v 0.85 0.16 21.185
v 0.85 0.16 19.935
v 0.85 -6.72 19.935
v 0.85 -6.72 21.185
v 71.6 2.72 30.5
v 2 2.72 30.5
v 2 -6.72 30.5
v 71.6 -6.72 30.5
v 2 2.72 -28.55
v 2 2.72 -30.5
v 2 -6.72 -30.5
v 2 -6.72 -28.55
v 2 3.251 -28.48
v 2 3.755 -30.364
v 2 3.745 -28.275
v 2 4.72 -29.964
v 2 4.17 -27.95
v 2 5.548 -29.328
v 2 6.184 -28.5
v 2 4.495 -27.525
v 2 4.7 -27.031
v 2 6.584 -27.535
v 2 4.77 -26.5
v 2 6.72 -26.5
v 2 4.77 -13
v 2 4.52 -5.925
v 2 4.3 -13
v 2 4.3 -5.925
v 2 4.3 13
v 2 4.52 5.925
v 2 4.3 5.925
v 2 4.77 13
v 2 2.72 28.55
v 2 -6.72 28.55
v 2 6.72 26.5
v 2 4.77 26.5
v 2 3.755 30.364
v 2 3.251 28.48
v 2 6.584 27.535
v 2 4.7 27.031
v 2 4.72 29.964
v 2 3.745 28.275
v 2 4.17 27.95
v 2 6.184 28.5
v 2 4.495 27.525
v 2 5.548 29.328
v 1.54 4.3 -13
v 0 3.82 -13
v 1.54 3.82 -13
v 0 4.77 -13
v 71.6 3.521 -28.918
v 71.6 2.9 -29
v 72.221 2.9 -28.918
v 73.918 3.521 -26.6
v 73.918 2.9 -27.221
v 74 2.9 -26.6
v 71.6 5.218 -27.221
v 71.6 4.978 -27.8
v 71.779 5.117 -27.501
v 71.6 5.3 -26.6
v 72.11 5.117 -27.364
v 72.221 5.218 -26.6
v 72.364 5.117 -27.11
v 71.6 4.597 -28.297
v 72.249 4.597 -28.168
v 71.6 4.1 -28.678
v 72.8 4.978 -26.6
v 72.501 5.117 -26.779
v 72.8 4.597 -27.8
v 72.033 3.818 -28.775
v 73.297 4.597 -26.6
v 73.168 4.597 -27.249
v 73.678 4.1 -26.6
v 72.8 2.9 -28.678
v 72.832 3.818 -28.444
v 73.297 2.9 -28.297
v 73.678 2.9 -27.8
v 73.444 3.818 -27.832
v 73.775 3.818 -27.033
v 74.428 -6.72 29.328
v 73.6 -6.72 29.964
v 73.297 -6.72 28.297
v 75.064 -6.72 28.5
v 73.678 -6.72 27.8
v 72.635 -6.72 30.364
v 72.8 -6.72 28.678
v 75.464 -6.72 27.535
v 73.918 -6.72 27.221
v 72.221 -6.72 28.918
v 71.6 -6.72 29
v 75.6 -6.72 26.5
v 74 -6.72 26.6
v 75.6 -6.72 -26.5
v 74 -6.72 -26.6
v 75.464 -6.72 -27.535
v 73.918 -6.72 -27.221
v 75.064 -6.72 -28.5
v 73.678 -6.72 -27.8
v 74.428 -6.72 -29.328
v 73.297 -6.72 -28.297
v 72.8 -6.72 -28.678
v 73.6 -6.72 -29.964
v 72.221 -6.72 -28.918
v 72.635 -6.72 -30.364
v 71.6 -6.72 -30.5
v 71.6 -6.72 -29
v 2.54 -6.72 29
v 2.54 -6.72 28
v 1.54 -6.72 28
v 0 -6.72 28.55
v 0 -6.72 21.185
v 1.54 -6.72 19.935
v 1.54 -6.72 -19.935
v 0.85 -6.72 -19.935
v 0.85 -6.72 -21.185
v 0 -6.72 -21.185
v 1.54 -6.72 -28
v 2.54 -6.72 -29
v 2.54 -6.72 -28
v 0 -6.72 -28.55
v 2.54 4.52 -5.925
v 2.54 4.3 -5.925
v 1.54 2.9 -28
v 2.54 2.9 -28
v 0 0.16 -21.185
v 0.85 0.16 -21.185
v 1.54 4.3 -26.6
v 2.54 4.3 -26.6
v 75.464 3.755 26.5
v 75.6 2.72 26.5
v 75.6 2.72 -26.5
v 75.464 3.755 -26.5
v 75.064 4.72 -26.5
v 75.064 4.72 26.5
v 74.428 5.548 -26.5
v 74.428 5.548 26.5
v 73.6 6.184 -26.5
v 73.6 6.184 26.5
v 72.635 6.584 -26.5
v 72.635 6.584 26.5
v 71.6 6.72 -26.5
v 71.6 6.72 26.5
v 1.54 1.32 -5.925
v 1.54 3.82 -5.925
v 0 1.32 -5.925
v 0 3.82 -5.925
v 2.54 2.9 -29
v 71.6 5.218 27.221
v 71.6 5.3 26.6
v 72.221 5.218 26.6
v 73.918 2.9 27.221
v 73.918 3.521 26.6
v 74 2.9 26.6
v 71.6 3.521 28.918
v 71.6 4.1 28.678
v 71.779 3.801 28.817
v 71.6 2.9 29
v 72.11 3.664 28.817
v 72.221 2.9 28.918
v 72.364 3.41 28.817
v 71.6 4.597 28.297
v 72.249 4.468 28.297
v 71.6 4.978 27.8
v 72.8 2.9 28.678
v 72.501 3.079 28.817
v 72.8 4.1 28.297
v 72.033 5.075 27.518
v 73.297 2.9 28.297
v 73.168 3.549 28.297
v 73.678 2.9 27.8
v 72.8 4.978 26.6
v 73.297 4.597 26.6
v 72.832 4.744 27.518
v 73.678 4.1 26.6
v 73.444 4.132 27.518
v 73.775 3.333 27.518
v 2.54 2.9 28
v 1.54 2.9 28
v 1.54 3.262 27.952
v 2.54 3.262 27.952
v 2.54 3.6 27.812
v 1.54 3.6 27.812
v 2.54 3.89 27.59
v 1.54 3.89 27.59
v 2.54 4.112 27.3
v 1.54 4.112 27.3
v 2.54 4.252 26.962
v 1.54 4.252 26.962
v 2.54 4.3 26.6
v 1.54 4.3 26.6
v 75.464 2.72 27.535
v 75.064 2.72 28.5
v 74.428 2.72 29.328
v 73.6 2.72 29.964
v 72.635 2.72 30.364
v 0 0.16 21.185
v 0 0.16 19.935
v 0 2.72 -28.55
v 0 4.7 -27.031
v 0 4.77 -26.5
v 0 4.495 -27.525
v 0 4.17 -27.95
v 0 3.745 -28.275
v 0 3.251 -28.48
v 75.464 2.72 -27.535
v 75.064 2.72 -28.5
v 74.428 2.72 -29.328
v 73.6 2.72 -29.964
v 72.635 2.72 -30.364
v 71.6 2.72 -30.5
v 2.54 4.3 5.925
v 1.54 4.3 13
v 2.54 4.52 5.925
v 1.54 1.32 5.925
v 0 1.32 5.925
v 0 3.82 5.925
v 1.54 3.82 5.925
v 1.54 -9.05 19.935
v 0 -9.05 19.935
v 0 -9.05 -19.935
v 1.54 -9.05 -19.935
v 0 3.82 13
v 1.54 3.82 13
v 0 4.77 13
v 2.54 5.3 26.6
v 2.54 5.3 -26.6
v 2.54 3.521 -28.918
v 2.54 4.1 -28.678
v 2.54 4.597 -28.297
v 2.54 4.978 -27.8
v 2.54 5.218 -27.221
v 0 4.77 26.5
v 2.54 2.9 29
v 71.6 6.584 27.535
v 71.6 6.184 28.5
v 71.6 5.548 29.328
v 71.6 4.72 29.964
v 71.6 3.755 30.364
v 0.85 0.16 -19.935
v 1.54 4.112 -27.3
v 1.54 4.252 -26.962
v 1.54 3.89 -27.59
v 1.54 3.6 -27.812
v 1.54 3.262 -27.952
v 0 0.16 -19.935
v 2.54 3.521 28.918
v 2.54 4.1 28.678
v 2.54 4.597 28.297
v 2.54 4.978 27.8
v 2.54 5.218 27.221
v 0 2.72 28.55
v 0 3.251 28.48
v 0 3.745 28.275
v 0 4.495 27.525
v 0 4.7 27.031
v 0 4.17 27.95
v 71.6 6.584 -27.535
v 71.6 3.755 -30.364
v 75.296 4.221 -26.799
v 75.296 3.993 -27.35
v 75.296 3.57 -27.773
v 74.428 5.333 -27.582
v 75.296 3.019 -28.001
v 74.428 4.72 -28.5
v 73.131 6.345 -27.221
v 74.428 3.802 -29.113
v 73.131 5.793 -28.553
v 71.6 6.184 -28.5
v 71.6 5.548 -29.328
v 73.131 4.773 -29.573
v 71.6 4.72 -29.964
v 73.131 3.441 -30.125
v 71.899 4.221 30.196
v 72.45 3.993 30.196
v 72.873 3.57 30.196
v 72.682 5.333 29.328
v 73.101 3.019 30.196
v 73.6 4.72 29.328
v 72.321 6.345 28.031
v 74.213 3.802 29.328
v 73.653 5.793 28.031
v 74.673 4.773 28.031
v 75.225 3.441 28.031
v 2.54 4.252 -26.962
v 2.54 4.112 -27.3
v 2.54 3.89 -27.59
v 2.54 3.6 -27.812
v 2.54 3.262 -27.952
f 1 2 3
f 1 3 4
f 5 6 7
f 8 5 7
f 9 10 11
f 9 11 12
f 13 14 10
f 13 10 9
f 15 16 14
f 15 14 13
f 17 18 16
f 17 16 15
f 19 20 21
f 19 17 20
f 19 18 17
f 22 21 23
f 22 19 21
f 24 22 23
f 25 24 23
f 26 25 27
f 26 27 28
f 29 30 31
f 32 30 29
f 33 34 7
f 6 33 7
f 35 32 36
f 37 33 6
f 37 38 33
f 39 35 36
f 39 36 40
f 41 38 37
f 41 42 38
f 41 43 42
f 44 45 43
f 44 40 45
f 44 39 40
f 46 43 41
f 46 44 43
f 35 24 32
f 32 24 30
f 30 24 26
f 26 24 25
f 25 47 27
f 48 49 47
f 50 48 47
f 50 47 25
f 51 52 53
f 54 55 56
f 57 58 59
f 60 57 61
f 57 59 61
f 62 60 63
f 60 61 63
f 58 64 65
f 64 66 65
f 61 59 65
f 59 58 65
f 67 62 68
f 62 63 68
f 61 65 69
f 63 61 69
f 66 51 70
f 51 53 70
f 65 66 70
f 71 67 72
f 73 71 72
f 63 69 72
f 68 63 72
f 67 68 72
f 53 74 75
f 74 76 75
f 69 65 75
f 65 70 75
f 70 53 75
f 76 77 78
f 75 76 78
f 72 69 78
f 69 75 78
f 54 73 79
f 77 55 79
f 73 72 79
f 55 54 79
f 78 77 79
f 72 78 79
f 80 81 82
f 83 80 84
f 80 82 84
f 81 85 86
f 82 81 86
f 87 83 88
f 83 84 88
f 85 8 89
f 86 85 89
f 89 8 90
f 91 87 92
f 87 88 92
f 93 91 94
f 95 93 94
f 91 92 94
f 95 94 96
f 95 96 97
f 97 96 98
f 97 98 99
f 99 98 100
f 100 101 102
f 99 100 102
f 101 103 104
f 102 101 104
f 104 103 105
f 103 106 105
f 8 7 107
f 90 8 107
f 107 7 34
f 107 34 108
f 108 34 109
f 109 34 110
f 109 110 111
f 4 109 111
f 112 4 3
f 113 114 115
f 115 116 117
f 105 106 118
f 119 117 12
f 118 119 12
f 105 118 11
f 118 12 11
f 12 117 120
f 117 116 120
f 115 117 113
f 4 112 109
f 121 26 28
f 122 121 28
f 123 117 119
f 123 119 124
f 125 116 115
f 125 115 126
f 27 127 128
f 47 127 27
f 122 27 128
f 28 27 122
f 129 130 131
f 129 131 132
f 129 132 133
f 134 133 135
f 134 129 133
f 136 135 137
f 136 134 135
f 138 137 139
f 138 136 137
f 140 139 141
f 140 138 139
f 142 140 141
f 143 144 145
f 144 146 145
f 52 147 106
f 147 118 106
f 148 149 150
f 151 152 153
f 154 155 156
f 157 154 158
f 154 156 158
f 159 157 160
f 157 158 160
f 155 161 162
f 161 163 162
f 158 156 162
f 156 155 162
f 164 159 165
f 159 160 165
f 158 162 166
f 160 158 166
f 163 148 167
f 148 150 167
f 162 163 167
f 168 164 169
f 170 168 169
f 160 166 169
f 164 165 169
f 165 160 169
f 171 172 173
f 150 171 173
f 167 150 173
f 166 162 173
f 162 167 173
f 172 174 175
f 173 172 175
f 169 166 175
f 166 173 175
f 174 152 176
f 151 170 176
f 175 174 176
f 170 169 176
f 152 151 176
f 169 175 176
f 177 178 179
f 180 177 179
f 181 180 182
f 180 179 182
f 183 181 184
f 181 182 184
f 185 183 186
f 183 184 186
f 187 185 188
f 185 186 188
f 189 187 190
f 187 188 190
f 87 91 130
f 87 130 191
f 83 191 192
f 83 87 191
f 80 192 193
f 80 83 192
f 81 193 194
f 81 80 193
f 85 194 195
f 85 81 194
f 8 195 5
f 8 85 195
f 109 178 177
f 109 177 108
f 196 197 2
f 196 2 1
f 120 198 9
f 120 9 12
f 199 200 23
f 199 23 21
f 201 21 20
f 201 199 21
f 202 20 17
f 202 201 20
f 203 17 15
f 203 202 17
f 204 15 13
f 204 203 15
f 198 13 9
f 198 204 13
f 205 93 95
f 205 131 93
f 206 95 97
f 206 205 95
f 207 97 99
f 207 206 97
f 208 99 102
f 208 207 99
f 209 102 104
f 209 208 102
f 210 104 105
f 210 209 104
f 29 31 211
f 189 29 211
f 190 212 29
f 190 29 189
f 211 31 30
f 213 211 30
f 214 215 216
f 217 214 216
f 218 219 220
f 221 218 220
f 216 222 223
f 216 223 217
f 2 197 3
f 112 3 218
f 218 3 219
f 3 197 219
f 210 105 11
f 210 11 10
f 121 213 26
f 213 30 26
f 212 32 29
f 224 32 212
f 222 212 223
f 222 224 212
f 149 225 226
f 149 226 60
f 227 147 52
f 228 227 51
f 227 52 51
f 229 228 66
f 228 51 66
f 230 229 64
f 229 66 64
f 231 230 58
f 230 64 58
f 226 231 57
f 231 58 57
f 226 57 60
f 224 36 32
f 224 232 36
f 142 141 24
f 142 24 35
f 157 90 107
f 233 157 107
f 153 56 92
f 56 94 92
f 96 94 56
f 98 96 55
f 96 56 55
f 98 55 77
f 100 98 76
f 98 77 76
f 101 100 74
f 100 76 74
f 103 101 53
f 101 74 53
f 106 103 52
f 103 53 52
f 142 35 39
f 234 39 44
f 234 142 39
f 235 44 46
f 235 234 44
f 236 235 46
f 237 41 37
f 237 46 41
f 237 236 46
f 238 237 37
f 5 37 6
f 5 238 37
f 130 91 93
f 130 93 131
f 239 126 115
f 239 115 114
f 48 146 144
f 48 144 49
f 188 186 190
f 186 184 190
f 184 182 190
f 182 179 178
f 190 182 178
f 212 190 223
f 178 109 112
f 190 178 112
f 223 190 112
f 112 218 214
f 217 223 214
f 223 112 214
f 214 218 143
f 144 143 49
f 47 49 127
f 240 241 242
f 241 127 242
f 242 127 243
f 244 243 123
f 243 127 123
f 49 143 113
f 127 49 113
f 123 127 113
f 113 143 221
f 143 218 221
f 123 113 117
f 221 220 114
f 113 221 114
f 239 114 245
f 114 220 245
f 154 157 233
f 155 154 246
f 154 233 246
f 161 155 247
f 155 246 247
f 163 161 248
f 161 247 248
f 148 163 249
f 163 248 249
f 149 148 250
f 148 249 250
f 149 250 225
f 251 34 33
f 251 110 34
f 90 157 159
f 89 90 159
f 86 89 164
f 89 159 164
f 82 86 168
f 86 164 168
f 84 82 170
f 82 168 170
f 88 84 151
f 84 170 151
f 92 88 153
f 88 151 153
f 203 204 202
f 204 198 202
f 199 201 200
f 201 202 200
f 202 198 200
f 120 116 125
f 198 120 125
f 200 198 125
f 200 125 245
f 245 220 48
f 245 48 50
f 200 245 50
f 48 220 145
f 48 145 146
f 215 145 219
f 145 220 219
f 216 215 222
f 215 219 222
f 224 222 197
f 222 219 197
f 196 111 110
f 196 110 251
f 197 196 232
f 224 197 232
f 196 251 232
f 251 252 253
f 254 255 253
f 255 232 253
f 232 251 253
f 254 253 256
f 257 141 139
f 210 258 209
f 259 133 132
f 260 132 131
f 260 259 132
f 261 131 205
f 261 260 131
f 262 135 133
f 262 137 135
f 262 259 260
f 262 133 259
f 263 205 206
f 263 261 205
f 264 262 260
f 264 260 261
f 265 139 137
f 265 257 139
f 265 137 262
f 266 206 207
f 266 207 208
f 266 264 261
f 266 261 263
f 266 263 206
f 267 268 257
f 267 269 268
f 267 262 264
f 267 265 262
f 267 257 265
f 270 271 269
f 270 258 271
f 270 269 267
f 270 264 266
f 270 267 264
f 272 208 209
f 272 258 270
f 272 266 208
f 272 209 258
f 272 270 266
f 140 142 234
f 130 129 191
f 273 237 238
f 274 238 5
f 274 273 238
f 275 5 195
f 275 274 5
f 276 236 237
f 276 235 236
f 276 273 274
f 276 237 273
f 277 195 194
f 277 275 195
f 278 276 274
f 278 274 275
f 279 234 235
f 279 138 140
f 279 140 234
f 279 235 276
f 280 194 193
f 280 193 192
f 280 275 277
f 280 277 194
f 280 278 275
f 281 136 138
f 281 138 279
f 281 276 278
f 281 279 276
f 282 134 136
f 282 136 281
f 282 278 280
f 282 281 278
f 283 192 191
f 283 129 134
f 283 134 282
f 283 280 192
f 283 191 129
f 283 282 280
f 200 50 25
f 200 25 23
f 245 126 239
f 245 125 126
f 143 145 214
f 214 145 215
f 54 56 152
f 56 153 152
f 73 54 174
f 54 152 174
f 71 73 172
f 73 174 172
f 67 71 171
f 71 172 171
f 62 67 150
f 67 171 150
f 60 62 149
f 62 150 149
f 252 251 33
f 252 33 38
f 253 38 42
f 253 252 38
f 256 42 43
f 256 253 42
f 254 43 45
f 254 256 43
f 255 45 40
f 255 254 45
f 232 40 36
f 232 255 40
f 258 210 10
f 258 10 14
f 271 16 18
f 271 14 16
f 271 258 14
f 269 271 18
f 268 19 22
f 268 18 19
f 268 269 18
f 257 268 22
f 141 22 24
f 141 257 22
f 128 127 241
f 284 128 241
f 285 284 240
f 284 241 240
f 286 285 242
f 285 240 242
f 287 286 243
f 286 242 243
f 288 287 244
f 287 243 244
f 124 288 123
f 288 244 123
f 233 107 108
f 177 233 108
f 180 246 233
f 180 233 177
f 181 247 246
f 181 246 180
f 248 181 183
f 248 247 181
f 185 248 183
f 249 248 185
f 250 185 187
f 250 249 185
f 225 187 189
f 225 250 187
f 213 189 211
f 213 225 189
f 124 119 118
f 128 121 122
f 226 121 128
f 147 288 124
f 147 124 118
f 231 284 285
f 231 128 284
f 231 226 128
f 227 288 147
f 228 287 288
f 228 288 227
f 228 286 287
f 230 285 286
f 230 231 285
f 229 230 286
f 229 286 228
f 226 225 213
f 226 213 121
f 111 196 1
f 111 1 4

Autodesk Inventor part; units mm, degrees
ref_plane "YZ Plane" through (0, 0, 0) normal (1, 0, 0) x (0, 1, 0)
ref_plane "XZ Plane" through (0, 0, 0) normal (0, 1, 0) x (-1, 0, 0)
ref_plane "XY Plane" through (0, 0, 0) normal (0, 0, 1) x (1, 0, 0)
sketch "Sketch1" plane through (0, 0, 0) normal (1, 0, 0) x (0, 1, 0)
  line L0 (6.72, 30.5) -> (-6.72, 30.5)
  line L1 (-6.72, 30.5) -> (-6.72, -30.5)
  line L2 (-6.72, -30.5) -> (6.72, -30.5)
  line L3 (6.72, -30.5) -> (6.72, 30.5)
  line L4 (6.72, 0) -> (-6.72, 0) construction
  point P0 (0, 0)
  point P1 (0, 0)
  dimension "d0" = 61
  dimension "d1" = 13.44
extrude "Extrusion1" add sketch "Sketch1" along normal blind 75.6
sketch "Sketch2" plane through (0, -6.72, -30.5) normal (0, -1, 0) x (1, 0, 0)
  line L0 (1.54, 1.5) -> (74, 1.5)
  line L1 (74, 1.5) -> (74, 59.5)
  line L2 (74, 59.5) -> (1.54, 59.5)
  line L3 (1.54, 59.5) -> (1.54, 1.5)
  line L4 (0, 30.5) -> (1.54, 30.5) construction
  line L5 (0, 61) -> (0, 0) construction
  line L6 (75.6, 61) -> (75.6, 0) construction
  line L7 (0, 61) -> (75.6, 61) construction
  dimension "d4" = 1.54
  dimension "d5" = 1.6
  dimension "d6" = 1.5
extrude "Extrusion2" cut sketch "Sketch2" against normal blind 12.02
fillet "Fillet1" radius 4 5 edges at (37.8, 6.72, -30.5) (75.6, 6.72, 0) (75.6, 0, -30.5) (37.8, 6.72, 30.5) (75.6, 0, 30.5)
fillet "Fillet2" radius 2.4 5 edges at (74, -0.71, -29) (37.77, 5.3, -29) (74, 5.3, 0) (74, -0.71, 29) (37.77, 5.3, 29)
sketch "Sketch3" plane through (0, 0, 0) normal (-1, 0, 0) x (0, 0, 1)
  line L0 (-30.5, -6.72) -> (-30.5, 2.72) projected
  arc A0 (-26.5, 6.72) -> (-30.5, 2.72) centre (-26.5, 2.72) ccw projected
  line L1 (-26.5, 6.72) -> (26.5, 6.72) projected
  arc A1 (30.5, 2.72) -> (26.5, 6.72) centre (26.5, 2.72) ccw projected
  line L2 (30.5, 2.72) -> (30.5, -6.72) projected
  line L3 (28.55, -6.72) -> (28.55, 2.72)
  arc A2 (28.55, 2.72) -> (26.5, 4.77) centre (26.5, 2.72) ccw
  line L4 (26.5, 4.77) -> (-26.5, 4.77)
  arc A3 (-26.5, 4.77) -> (-28.55, 2.72) centre (-26.5, 2.72) ccw
  line L5 (-28.55, 2.72) -> (-28.55, -6.72)
  line L6 (-26.5, -6.72) -> (-30.5, -6.72) construction
  line L7 (-28.55, -6.72) -> (-30.5, -6.72)
  line L8 (28.55, -6.72) -> (30.5, -6.72)
  line L9 (-29, -6.72) -> (29, -6.72) construction
  point P0 (0, 0)
  dimension "d11" = 1.95
extrude "Extrusion3" cut sketch "Sketch3" against normal blind 2
sketch "Sketch4" plane through (1.54, -6.72, 28.55) normal (1, 0, 0) x (0, 0, -1)
  line L0 (1.95, 12.02) -> (55.15, 12.02) projected
  arc A0 (57.55, 9.62) -> (55.15, 12.02) centre (55.15, 9.62) ccw projected
  line L1 (57.55, 9.62) -> (57.55, 0) projected
  arc A1 (1.95, 12.02) -> (-0.45, 9.62) centre (1.95, 9.62) ccw projected
  line L2 (-0.45, 0) -> (-0.45, 9.62) projected
  line L3 (56.55, 0) -> (56.55, 9.62)
  arc A2 (56.55, 9.62) -> (55.15, 11.02) centre (55.15, 9.62) ccw
  line L4 (55.15, 11.02) -> (1.95, 11.02)
  arc A3 (1.95, 11.02) -> (0.55, 9.62) centre (1.95, 9.62) ccw
  line L5 (0.55, 9.62) -> (0.55, 0)
  line L6 (56.55, 0) -> (57.55, 0)
  line L7 (-0.45, 0) -> (0.55, 0)
  line L8 (57.1, 0) -> (0, 0) construction
  point P0 (28.55, 6.72)
  dimension "d14" = 1
extrude "Extrusion4" add sketch "Sketch4" along normal blind 1
sketch "Sketch5" plane through (0, 0, 0) normal (-1, 0, 0) x (0, 0, 1)
  arc A0 (-26.5, 6.72) -> (-30.5, 2.72) centre (-26.5, 2.72) ccw projected
  line L0 (-26.5, 6.72) -> (26.5, 6.72) projected
  line L1 (-30.5, -6.72) -> (-30.5, 2.72) projected
  line L2 (-29, -6.72) -> (-30.5, -6.72) projected
  line L3 (-28.55, -6.72) -> (-29, -6.72) projected
  line L4 (-28.55, 2.72) -> (-28.55, -6.72) projected
  arc A1 (-26.5, 4.77) -> (-28.55, 2.72) centre (-26.5, 2.72) ccw projected
  line L5 (26.5, 4.77) -> (-26.5, 4.77) projected
  arc A2 (30.5, 2.72) -> (26.5, 6.72) centre (26.5, 2.72) ccw projected
  arc A3 (28.55, 2.72) -> (26.5, 4.77) centre (26.5, 2.72) ccw projected
  line L6 (28.55, -6.72) -> (28.55, 2.72) projected
  line L7 (30.5, 2.72) -> (30.5, -6.72) projected
  line L8 (30.5, -6.72) -> (29, -6.72) projected
  line L9 (29, -6.72) -> (28.55, -6.72) projected
  point P0 (0, 0)
extrude "Extrusion5" cut sketch "Sketch5" against normal up to surface (2 mm away)
sketch "Sketch6" plane through (0, 0, 0) normal (-1, 0, 0) x (0, 0, 1)
  line L0 (26.5, 4.77) -> (-26.5, 4.77) construction
  line L1 (-13, 4.77) -> (13, 4.77)
  line L2 (13, 4.77) -> (13, 3.82)
  line L3 (13, 3.82) -> (-13, 3.82)
  line L4 (-13, 3.82) -> (-13, 4.77)
  line L5 (-26.5, 6.72) -> (26.5, 6.72) construction
  point P0 (0, 0)
  point P1 (0, 4.77)
  dimension "d19" = 26
  dimension "d21" = 2.9
extrude "Extrusion6" cut sketch "Sketch6" against normal up to surface (2 mm away)
sketch "Sketch7" plane through (0, 0, 0) normal (-1, 0, 0) x (0, 0, 1)
  line L0 (-5.925, 1.32) -> (5.925, 1.32)
  line L1 (5.925, 1.32) -> (5.925, 4.52)
  line L2 (5.925, 4.52) -> (-5.925, 4.52)
  line L3 (-5.925, 4.52) -> (-5.925, 1.32)
  line L4 (-26.5, 6.72) -> (26.5, 6.72) construction
  line L5 (0, 6.72) -> (0, 4.52) construction
  point P0 (0, 0)
  dimension "d24" = 2.2
  dimension "d25" = 3.2
  dimension "d26" = 11.85
extrude "Extrusion7" cut sketch "Sketch7" against normal up to surface (2.54 mm away)
sketch "Sketch8" plane through (0, 0, 0) normal (-1, 0, 0) x (0, 0, 1)
  line L0 (-19.935, -6.72) -> (19.935, -6.72)
  line L1 (19.935, -6.72) -> (19.935, -9.05)
  line L2 (19.935, -9.05) -> (-19.935, -9.05)
  line L3 (-19.935, -9.05) -> (-19.935, -6.72)
  line L4 (28.55, -6.72) -> (-28.55, -6.72) construction
  point P0 (0, 0)
  point P1 (0, -6.72)
  dimension "d29" = 39.87
  dimension "d30" = 2.33
extrude "Extrusion8" add sketch "Sketch8" against normal up to surface (1.54 mm away)
sketch "Sketch9" plane through (0, 0, 0) normal (-1, 0, 0) x (0, 0, 1)
  line L0 (-21.185, 0.16) -> (-19.935, 0.16)
  line L1 (-19.935, 0.16) -> (-19.935, -6.72)
  line L2 (-19.935, -6.72) -> (-21.185, -6.72)
  line L3 (-21.185, -6.72) -> (-21.185, 0.16)
  line L4 (19.935, 0.16) -> (21.185, 0.16)
  line L5 (21.185, 0.16) -> (21.185, -6.72)
  line L6 (21.185, -6.72) -> (19.935, -6.72)
  line L7 (19.935, -6.72) -> (19.935, 0.16)
  line L8 (-19.935, -3.28) -> (19.935, -3.28) construction
  line L9 (0, 0) -> (0, -3.28) construction
  line L10 (-19.935, -6.72) -> (-19.935, -9.05) construction
  line L11 (-19.935, -6.72) -> (-28.55, -6.72) construction
  dimension "d33" = 1.25
  dimension "d34" = 6.88
extrude "Extrusion9" cut sketch "Sketch9" against normal blind 0.85
properties part number "aus-200_top" material "PC/ABS Plastic"
